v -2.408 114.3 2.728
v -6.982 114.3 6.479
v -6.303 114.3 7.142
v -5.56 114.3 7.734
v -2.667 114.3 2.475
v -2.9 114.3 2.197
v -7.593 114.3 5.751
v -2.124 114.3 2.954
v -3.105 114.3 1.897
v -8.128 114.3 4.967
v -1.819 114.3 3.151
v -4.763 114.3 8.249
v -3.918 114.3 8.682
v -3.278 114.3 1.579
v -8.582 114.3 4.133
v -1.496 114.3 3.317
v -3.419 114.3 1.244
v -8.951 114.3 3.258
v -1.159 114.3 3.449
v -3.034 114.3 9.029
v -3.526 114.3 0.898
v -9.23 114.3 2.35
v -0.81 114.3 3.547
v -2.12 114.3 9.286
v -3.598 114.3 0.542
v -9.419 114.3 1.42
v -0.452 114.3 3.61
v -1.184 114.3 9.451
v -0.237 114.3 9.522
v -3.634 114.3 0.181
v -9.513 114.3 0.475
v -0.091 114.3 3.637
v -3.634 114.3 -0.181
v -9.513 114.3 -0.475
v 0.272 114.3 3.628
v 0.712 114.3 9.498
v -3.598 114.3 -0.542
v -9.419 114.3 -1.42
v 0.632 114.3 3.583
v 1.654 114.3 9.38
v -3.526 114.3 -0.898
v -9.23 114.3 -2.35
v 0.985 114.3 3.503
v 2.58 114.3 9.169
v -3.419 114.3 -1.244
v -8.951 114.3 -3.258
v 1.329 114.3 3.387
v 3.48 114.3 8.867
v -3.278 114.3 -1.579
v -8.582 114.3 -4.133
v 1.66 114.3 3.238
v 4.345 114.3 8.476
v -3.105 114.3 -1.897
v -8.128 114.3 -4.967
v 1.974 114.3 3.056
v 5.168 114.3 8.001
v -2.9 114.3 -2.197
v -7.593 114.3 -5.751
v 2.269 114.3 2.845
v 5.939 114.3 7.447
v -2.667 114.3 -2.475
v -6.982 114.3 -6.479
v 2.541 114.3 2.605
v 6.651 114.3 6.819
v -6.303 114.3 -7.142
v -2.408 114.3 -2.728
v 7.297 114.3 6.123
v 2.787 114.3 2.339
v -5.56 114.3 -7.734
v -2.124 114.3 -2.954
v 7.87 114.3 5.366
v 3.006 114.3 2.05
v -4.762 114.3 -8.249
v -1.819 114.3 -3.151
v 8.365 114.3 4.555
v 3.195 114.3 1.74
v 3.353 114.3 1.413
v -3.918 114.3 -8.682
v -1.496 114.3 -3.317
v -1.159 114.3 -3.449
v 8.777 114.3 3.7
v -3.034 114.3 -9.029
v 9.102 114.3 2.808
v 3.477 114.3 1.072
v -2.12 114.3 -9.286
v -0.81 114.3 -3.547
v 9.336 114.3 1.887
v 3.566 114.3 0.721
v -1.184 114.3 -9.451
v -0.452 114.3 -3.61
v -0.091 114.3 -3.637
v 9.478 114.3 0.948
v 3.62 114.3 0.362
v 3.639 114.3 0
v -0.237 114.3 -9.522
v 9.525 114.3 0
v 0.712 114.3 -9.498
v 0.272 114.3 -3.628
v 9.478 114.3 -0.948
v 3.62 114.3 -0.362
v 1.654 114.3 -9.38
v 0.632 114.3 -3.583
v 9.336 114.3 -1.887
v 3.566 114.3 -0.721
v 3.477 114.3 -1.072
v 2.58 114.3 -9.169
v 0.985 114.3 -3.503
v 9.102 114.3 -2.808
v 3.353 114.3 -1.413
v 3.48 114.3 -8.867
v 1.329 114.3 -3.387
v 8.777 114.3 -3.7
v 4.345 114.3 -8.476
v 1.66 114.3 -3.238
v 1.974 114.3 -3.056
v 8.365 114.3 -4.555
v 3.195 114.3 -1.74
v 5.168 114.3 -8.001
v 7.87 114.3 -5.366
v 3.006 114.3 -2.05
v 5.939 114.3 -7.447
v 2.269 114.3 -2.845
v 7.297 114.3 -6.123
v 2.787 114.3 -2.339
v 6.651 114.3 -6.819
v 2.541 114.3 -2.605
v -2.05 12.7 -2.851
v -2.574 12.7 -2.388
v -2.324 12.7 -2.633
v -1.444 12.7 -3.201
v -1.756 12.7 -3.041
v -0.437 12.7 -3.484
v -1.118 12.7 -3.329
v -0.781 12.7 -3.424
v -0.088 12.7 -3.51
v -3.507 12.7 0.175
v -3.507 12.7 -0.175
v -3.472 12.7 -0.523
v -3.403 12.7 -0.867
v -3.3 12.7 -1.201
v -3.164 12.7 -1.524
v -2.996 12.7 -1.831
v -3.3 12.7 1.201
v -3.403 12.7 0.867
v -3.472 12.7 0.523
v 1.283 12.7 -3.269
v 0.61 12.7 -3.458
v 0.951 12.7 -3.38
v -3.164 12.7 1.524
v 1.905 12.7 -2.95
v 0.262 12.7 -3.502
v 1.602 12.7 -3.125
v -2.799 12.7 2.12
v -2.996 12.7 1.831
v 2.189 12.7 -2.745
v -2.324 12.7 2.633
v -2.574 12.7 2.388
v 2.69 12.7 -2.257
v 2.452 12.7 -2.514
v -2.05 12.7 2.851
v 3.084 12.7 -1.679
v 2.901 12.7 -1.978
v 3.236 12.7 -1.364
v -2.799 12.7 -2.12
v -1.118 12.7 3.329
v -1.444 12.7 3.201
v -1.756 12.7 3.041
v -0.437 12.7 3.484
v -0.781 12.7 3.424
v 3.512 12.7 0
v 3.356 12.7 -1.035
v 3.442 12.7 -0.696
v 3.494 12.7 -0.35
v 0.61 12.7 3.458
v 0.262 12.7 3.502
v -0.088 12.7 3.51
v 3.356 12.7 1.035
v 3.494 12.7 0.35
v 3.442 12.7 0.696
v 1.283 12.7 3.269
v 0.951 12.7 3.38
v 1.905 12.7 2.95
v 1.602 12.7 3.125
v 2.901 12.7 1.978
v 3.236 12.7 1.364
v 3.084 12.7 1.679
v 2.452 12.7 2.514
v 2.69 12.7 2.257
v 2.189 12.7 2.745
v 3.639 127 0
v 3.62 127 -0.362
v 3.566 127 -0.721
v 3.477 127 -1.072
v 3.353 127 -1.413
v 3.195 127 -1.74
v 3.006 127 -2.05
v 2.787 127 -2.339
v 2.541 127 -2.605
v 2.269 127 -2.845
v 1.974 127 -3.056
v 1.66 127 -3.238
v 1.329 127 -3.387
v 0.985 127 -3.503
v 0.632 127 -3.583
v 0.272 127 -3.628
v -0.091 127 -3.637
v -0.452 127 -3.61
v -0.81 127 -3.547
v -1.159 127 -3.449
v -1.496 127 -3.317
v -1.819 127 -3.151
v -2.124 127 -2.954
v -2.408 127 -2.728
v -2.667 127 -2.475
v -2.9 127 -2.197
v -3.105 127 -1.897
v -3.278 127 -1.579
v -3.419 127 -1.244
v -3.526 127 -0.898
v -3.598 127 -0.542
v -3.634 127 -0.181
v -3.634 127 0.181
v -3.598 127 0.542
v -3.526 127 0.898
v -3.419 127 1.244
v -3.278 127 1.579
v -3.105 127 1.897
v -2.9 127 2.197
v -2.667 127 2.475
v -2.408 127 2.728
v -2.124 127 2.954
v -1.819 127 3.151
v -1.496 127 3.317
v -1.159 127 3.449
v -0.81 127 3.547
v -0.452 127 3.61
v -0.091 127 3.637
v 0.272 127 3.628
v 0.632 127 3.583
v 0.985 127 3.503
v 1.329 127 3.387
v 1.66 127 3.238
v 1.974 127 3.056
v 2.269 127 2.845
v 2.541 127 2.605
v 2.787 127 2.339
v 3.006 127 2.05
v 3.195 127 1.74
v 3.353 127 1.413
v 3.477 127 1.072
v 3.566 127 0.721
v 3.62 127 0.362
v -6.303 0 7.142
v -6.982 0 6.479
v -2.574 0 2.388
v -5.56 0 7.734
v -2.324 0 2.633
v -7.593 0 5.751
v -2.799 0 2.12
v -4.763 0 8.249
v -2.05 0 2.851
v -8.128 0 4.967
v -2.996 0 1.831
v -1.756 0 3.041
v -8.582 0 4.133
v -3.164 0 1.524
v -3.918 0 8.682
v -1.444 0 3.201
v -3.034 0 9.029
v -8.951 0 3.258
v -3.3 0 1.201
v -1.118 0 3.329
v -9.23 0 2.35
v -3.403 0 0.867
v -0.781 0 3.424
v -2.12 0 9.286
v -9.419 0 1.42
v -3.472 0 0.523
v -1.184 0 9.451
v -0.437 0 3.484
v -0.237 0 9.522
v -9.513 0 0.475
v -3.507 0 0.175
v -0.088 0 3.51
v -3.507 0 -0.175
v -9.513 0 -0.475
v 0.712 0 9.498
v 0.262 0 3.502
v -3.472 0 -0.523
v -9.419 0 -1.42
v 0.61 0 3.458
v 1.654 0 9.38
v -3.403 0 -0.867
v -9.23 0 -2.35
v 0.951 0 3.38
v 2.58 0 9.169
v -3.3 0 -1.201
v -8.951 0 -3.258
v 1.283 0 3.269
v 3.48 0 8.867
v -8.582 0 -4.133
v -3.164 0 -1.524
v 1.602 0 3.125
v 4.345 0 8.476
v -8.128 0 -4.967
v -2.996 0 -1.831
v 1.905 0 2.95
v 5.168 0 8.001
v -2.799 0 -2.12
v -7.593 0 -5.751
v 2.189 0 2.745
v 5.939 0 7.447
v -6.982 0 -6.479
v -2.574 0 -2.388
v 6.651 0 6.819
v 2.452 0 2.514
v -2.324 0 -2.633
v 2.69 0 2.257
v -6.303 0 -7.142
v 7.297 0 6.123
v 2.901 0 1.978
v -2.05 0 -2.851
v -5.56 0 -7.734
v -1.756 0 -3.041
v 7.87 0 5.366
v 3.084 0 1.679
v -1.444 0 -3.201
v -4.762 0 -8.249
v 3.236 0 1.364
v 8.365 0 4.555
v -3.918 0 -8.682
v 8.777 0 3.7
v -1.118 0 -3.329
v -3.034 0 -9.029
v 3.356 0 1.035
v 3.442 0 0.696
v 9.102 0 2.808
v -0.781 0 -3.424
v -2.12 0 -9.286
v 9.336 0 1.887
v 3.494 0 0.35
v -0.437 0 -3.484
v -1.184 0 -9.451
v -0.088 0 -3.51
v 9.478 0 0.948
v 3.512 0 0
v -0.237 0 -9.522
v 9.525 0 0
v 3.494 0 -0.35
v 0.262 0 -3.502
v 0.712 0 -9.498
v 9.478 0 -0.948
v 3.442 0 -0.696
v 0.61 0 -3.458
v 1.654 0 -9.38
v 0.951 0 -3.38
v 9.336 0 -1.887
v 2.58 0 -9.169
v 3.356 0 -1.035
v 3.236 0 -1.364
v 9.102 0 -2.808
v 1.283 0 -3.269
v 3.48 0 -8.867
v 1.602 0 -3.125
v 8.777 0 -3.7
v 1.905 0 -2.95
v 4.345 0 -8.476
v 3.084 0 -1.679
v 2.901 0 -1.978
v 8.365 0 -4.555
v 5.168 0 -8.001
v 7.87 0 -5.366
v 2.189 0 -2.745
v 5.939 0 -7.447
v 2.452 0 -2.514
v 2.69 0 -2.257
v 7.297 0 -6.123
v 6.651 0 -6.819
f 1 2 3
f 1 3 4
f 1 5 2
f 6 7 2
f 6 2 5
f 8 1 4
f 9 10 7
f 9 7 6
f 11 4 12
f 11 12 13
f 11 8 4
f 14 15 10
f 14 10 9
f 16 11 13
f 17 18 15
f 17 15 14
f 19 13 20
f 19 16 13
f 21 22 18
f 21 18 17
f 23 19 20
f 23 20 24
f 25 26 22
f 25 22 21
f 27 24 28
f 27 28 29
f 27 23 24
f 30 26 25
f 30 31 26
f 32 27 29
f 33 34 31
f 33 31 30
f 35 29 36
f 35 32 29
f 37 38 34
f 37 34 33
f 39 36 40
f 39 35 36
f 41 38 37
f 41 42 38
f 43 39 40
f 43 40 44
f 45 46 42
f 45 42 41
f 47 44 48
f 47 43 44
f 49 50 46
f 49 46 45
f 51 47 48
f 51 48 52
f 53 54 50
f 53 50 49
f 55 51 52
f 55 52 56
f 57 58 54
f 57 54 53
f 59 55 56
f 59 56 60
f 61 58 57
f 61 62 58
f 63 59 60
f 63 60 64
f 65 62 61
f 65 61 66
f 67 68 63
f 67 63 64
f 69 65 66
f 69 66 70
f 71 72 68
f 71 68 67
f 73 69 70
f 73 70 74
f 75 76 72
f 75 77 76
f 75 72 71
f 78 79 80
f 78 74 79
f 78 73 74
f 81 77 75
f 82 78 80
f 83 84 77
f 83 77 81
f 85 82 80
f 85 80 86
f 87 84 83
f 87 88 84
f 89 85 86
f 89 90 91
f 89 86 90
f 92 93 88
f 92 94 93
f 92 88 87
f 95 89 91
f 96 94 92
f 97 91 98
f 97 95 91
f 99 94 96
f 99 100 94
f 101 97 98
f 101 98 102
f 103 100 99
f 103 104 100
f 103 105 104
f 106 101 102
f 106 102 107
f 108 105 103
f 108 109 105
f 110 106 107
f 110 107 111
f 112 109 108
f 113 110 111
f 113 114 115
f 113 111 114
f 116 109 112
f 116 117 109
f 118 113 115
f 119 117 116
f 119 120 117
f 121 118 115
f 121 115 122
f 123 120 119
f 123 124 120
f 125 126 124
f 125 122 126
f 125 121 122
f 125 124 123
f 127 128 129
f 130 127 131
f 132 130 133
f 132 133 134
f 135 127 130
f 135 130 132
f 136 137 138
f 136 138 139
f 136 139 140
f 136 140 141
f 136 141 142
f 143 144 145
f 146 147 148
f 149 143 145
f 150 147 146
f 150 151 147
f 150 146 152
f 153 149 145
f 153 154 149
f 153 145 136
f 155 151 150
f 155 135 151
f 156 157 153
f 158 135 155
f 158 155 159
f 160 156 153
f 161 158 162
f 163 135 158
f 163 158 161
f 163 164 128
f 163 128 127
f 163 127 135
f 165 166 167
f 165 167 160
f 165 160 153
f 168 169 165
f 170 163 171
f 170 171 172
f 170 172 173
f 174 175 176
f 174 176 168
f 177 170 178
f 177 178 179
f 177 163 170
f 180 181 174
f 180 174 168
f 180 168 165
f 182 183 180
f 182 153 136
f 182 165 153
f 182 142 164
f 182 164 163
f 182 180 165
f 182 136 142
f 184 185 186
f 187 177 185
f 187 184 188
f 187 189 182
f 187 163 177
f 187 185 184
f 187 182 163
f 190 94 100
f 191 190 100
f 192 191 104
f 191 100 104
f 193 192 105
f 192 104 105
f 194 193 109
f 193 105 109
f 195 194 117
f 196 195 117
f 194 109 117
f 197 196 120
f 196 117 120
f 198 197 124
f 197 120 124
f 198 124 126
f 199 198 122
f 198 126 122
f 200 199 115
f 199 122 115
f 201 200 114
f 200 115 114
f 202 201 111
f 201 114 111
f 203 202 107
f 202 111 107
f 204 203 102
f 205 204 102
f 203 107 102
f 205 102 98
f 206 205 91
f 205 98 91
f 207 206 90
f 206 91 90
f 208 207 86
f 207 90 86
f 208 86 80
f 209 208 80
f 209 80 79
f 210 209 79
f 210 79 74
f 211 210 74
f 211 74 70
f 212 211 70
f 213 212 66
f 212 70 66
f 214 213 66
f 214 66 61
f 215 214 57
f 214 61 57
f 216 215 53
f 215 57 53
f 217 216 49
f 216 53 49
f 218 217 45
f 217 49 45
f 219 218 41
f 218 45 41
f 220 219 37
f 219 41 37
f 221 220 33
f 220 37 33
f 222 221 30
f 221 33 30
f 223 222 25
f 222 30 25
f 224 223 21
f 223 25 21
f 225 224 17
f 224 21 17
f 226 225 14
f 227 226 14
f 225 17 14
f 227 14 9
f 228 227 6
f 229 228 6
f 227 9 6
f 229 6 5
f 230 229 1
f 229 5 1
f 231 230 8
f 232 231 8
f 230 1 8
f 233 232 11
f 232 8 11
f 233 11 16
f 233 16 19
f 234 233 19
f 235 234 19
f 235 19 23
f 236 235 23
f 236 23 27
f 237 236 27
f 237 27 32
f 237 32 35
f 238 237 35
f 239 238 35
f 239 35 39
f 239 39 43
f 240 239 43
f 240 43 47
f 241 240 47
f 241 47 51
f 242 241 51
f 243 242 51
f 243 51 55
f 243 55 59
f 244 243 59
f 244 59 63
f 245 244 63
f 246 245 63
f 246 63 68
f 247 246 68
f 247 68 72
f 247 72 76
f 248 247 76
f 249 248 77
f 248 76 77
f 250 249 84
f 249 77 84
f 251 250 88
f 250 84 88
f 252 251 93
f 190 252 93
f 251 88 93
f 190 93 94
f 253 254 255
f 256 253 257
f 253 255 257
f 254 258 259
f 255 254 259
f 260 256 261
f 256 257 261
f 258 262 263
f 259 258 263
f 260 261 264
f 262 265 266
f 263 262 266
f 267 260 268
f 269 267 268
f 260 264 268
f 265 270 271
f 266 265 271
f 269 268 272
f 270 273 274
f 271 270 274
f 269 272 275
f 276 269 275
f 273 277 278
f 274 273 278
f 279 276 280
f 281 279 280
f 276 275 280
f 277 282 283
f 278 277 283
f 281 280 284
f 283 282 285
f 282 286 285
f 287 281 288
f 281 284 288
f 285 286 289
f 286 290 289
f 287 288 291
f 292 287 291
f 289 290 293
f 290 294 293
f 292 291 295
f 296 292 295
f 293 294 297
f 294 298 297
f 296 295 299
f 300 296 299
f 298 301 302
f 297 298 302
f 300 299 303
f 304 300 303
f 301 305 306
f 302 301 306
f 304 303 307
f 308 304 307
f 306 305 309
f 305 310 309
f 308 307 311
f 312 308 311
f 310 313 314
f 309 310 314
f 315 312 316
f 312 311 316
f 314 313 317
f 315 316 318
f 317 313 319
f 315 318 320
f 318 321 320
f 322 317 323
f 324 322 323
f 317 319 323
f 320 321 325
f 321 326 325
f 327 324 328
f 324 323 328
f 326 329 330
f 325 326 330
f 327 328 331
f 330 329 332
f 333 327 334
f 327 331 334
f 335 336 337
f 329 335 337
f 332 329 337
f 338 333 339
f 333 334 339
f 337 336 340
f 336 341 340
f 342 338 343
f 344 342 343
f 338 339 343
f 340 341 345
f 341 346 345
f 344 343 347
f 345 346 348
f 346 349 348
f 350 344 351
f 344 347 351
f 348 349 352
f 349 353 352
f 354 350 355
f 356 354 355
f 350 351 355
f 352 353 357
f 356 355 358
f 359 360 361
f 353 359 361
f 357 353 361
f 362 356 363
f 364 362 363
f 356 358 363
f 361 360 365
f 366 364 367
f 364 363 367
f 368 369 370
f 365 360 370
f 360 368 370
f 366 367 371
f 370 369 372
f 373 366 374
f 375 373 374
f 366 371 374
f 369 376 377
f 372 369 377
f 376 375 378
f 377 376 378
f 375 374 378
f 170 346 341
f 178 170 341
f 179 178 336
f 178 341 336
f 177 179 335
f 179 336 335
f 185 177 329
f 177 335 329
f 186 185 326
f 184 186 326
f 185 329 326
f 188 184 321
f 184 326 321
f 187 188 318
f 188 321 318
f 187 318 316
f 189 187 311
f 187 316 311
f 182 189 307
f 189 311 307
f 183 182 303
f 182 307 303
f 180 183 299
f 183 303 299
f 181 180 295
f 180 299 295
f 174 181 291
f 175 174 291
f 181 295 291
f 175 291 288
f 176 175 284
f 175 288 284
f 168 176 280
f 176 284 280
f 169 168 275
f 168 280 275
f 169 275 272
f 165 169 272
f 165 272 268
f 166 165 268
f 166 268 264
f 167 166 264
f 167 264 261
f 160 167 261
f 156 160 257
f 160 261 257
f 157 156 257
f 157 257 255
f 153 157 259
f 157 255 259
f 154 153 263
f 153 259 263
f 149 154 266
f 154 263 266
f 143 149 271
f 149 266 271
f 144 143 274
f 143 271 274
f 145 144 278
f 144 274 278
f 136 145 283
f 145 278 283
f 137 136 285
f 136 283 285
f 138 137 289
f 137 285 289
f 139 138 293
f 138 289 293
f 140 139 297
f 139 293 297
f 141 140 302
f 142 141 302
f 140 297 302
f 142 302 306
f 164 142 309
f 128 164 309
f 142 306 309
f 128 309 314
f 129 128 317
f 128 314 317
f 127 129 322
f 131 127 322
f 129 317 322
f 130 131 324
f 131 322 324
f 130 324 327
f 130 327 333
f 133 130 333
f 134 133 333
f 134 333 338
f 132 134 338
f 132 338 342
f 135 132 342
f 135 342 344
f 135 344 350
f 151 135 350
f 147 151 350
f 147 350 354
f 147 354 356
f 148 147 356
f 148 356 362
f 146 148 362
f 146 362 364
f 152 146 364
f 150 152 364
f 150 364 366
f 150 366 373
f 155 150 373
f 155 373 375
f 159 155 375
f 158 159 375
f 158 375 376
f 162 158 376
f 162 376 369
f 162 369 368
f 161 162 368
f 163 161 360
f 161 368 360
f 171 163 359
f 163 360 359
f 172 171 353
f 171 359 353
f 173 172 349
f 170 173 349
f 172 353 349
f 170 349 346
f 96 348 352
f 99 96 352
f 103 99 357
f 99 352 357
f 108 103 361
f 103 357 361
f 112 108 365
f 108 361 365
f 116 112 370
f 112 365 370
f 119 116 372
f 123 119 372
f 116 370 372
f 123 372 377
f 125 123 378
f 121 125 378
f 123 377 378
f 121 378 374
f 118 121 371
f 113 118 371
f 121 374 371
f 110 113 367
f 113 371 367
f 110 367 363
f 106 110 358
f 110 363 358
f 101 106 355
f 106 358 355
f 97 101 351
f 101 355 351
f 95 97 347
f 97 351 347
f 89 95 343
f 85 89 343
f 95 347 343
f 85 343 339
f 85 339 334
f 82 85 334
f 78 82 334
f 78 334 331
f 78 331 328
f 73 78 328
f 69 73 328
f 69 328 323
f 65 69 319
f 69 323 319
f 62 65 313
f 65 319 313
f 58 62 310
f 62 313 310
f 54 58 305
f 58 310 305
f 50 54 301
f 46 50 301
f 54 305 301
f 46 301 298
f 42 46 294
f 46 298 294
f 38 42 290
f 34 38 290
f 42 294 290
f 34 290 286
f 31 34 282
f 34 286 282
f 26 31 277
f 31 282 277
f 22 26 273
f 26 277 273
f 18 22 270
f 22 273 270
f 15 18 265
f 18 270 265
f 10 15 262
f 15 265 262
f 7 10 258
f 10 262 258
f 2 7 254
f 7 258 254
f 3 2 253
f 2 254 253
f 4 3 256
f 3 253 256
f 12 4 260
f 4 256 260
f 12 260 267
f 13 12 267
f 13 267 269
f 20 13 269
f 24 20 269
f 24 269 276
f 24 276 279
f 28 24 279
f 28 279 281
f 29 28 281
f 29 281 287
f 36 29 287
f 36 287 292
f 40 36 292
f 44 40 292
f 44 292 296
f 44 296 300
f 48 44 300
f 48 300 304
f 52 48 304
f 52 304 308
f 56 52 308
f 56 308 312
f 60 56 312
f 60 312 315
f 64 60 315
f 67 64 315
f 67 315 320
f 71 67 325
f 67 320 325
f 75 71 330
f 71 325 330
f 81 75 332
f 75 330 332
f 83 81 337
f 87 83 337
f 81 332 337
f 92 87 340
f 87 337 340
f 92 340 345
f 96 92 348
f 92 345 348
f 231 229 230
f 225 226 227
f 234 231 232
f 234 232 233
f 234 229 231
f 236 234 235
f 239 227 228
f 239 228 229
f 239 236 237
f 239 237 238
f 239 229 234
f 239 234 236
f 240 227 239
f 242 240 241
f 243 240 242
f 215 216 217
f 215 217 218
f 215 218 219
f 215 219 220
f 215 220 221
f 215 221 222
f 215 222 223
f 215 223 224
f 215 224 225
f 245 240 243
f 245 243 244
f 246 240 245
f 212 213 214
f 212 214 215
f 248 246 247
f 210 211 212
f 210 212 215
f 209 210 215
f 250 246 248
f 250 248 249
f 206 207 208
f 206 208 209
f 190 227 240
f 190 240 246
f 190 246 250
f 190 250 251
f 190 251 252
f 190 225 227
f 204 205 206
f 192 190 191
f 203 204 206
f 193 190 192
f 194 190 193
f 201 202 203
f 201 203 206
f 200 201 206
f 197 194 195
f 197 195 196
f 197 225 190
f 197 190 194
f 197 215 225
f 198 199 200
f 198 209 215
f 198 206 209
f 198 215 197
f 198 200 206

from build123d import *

# Parameters (mm, degrees)
SKETCH1_R           = 9.525
BOSS_EXTRUDE1_DEPTH = 114.3
SKETCH2_R           = 3.63855
BOSS_EXTRUDE2_DEPTH = 12.7
SKETCH3_R           = 3.51155
CUT_EXTRUDE1_DEPTH  = 12.7


with BuildPart() as part:
    # Sketch1 → Boss-Extrude1 (new body)
    with BuildSketch(Plane(origin=(0, 0, 0), x_dir=(1, 0, 0), z_dir=(0, 1, 0))):
        Circle(SKETCH1_R)
    extrude(amount=BOSS_EXTRUDE1_DEPTH)

    # Sketch2 → Boss-Extrude2 (add)
    with BuildSketch(Plane(origin=(0, 114.3, 0), x_dir=(1, 0, 0), z_dir=(0, 1, 0))):
        Circle(SKETCH2_R)
    extrude(amount=BOSS_EXTRUDE2_DEPTH)

    # Sketch3 → Cut-Extrude1 (cut)
    with BuildSketch(Plane.XZ):
        Circle(SKETCH3_R)
    extrude(amount=-CUT_EXTRUDE1_DEPTH, mode=Mode.SUBTRACT)


solid = part.part
